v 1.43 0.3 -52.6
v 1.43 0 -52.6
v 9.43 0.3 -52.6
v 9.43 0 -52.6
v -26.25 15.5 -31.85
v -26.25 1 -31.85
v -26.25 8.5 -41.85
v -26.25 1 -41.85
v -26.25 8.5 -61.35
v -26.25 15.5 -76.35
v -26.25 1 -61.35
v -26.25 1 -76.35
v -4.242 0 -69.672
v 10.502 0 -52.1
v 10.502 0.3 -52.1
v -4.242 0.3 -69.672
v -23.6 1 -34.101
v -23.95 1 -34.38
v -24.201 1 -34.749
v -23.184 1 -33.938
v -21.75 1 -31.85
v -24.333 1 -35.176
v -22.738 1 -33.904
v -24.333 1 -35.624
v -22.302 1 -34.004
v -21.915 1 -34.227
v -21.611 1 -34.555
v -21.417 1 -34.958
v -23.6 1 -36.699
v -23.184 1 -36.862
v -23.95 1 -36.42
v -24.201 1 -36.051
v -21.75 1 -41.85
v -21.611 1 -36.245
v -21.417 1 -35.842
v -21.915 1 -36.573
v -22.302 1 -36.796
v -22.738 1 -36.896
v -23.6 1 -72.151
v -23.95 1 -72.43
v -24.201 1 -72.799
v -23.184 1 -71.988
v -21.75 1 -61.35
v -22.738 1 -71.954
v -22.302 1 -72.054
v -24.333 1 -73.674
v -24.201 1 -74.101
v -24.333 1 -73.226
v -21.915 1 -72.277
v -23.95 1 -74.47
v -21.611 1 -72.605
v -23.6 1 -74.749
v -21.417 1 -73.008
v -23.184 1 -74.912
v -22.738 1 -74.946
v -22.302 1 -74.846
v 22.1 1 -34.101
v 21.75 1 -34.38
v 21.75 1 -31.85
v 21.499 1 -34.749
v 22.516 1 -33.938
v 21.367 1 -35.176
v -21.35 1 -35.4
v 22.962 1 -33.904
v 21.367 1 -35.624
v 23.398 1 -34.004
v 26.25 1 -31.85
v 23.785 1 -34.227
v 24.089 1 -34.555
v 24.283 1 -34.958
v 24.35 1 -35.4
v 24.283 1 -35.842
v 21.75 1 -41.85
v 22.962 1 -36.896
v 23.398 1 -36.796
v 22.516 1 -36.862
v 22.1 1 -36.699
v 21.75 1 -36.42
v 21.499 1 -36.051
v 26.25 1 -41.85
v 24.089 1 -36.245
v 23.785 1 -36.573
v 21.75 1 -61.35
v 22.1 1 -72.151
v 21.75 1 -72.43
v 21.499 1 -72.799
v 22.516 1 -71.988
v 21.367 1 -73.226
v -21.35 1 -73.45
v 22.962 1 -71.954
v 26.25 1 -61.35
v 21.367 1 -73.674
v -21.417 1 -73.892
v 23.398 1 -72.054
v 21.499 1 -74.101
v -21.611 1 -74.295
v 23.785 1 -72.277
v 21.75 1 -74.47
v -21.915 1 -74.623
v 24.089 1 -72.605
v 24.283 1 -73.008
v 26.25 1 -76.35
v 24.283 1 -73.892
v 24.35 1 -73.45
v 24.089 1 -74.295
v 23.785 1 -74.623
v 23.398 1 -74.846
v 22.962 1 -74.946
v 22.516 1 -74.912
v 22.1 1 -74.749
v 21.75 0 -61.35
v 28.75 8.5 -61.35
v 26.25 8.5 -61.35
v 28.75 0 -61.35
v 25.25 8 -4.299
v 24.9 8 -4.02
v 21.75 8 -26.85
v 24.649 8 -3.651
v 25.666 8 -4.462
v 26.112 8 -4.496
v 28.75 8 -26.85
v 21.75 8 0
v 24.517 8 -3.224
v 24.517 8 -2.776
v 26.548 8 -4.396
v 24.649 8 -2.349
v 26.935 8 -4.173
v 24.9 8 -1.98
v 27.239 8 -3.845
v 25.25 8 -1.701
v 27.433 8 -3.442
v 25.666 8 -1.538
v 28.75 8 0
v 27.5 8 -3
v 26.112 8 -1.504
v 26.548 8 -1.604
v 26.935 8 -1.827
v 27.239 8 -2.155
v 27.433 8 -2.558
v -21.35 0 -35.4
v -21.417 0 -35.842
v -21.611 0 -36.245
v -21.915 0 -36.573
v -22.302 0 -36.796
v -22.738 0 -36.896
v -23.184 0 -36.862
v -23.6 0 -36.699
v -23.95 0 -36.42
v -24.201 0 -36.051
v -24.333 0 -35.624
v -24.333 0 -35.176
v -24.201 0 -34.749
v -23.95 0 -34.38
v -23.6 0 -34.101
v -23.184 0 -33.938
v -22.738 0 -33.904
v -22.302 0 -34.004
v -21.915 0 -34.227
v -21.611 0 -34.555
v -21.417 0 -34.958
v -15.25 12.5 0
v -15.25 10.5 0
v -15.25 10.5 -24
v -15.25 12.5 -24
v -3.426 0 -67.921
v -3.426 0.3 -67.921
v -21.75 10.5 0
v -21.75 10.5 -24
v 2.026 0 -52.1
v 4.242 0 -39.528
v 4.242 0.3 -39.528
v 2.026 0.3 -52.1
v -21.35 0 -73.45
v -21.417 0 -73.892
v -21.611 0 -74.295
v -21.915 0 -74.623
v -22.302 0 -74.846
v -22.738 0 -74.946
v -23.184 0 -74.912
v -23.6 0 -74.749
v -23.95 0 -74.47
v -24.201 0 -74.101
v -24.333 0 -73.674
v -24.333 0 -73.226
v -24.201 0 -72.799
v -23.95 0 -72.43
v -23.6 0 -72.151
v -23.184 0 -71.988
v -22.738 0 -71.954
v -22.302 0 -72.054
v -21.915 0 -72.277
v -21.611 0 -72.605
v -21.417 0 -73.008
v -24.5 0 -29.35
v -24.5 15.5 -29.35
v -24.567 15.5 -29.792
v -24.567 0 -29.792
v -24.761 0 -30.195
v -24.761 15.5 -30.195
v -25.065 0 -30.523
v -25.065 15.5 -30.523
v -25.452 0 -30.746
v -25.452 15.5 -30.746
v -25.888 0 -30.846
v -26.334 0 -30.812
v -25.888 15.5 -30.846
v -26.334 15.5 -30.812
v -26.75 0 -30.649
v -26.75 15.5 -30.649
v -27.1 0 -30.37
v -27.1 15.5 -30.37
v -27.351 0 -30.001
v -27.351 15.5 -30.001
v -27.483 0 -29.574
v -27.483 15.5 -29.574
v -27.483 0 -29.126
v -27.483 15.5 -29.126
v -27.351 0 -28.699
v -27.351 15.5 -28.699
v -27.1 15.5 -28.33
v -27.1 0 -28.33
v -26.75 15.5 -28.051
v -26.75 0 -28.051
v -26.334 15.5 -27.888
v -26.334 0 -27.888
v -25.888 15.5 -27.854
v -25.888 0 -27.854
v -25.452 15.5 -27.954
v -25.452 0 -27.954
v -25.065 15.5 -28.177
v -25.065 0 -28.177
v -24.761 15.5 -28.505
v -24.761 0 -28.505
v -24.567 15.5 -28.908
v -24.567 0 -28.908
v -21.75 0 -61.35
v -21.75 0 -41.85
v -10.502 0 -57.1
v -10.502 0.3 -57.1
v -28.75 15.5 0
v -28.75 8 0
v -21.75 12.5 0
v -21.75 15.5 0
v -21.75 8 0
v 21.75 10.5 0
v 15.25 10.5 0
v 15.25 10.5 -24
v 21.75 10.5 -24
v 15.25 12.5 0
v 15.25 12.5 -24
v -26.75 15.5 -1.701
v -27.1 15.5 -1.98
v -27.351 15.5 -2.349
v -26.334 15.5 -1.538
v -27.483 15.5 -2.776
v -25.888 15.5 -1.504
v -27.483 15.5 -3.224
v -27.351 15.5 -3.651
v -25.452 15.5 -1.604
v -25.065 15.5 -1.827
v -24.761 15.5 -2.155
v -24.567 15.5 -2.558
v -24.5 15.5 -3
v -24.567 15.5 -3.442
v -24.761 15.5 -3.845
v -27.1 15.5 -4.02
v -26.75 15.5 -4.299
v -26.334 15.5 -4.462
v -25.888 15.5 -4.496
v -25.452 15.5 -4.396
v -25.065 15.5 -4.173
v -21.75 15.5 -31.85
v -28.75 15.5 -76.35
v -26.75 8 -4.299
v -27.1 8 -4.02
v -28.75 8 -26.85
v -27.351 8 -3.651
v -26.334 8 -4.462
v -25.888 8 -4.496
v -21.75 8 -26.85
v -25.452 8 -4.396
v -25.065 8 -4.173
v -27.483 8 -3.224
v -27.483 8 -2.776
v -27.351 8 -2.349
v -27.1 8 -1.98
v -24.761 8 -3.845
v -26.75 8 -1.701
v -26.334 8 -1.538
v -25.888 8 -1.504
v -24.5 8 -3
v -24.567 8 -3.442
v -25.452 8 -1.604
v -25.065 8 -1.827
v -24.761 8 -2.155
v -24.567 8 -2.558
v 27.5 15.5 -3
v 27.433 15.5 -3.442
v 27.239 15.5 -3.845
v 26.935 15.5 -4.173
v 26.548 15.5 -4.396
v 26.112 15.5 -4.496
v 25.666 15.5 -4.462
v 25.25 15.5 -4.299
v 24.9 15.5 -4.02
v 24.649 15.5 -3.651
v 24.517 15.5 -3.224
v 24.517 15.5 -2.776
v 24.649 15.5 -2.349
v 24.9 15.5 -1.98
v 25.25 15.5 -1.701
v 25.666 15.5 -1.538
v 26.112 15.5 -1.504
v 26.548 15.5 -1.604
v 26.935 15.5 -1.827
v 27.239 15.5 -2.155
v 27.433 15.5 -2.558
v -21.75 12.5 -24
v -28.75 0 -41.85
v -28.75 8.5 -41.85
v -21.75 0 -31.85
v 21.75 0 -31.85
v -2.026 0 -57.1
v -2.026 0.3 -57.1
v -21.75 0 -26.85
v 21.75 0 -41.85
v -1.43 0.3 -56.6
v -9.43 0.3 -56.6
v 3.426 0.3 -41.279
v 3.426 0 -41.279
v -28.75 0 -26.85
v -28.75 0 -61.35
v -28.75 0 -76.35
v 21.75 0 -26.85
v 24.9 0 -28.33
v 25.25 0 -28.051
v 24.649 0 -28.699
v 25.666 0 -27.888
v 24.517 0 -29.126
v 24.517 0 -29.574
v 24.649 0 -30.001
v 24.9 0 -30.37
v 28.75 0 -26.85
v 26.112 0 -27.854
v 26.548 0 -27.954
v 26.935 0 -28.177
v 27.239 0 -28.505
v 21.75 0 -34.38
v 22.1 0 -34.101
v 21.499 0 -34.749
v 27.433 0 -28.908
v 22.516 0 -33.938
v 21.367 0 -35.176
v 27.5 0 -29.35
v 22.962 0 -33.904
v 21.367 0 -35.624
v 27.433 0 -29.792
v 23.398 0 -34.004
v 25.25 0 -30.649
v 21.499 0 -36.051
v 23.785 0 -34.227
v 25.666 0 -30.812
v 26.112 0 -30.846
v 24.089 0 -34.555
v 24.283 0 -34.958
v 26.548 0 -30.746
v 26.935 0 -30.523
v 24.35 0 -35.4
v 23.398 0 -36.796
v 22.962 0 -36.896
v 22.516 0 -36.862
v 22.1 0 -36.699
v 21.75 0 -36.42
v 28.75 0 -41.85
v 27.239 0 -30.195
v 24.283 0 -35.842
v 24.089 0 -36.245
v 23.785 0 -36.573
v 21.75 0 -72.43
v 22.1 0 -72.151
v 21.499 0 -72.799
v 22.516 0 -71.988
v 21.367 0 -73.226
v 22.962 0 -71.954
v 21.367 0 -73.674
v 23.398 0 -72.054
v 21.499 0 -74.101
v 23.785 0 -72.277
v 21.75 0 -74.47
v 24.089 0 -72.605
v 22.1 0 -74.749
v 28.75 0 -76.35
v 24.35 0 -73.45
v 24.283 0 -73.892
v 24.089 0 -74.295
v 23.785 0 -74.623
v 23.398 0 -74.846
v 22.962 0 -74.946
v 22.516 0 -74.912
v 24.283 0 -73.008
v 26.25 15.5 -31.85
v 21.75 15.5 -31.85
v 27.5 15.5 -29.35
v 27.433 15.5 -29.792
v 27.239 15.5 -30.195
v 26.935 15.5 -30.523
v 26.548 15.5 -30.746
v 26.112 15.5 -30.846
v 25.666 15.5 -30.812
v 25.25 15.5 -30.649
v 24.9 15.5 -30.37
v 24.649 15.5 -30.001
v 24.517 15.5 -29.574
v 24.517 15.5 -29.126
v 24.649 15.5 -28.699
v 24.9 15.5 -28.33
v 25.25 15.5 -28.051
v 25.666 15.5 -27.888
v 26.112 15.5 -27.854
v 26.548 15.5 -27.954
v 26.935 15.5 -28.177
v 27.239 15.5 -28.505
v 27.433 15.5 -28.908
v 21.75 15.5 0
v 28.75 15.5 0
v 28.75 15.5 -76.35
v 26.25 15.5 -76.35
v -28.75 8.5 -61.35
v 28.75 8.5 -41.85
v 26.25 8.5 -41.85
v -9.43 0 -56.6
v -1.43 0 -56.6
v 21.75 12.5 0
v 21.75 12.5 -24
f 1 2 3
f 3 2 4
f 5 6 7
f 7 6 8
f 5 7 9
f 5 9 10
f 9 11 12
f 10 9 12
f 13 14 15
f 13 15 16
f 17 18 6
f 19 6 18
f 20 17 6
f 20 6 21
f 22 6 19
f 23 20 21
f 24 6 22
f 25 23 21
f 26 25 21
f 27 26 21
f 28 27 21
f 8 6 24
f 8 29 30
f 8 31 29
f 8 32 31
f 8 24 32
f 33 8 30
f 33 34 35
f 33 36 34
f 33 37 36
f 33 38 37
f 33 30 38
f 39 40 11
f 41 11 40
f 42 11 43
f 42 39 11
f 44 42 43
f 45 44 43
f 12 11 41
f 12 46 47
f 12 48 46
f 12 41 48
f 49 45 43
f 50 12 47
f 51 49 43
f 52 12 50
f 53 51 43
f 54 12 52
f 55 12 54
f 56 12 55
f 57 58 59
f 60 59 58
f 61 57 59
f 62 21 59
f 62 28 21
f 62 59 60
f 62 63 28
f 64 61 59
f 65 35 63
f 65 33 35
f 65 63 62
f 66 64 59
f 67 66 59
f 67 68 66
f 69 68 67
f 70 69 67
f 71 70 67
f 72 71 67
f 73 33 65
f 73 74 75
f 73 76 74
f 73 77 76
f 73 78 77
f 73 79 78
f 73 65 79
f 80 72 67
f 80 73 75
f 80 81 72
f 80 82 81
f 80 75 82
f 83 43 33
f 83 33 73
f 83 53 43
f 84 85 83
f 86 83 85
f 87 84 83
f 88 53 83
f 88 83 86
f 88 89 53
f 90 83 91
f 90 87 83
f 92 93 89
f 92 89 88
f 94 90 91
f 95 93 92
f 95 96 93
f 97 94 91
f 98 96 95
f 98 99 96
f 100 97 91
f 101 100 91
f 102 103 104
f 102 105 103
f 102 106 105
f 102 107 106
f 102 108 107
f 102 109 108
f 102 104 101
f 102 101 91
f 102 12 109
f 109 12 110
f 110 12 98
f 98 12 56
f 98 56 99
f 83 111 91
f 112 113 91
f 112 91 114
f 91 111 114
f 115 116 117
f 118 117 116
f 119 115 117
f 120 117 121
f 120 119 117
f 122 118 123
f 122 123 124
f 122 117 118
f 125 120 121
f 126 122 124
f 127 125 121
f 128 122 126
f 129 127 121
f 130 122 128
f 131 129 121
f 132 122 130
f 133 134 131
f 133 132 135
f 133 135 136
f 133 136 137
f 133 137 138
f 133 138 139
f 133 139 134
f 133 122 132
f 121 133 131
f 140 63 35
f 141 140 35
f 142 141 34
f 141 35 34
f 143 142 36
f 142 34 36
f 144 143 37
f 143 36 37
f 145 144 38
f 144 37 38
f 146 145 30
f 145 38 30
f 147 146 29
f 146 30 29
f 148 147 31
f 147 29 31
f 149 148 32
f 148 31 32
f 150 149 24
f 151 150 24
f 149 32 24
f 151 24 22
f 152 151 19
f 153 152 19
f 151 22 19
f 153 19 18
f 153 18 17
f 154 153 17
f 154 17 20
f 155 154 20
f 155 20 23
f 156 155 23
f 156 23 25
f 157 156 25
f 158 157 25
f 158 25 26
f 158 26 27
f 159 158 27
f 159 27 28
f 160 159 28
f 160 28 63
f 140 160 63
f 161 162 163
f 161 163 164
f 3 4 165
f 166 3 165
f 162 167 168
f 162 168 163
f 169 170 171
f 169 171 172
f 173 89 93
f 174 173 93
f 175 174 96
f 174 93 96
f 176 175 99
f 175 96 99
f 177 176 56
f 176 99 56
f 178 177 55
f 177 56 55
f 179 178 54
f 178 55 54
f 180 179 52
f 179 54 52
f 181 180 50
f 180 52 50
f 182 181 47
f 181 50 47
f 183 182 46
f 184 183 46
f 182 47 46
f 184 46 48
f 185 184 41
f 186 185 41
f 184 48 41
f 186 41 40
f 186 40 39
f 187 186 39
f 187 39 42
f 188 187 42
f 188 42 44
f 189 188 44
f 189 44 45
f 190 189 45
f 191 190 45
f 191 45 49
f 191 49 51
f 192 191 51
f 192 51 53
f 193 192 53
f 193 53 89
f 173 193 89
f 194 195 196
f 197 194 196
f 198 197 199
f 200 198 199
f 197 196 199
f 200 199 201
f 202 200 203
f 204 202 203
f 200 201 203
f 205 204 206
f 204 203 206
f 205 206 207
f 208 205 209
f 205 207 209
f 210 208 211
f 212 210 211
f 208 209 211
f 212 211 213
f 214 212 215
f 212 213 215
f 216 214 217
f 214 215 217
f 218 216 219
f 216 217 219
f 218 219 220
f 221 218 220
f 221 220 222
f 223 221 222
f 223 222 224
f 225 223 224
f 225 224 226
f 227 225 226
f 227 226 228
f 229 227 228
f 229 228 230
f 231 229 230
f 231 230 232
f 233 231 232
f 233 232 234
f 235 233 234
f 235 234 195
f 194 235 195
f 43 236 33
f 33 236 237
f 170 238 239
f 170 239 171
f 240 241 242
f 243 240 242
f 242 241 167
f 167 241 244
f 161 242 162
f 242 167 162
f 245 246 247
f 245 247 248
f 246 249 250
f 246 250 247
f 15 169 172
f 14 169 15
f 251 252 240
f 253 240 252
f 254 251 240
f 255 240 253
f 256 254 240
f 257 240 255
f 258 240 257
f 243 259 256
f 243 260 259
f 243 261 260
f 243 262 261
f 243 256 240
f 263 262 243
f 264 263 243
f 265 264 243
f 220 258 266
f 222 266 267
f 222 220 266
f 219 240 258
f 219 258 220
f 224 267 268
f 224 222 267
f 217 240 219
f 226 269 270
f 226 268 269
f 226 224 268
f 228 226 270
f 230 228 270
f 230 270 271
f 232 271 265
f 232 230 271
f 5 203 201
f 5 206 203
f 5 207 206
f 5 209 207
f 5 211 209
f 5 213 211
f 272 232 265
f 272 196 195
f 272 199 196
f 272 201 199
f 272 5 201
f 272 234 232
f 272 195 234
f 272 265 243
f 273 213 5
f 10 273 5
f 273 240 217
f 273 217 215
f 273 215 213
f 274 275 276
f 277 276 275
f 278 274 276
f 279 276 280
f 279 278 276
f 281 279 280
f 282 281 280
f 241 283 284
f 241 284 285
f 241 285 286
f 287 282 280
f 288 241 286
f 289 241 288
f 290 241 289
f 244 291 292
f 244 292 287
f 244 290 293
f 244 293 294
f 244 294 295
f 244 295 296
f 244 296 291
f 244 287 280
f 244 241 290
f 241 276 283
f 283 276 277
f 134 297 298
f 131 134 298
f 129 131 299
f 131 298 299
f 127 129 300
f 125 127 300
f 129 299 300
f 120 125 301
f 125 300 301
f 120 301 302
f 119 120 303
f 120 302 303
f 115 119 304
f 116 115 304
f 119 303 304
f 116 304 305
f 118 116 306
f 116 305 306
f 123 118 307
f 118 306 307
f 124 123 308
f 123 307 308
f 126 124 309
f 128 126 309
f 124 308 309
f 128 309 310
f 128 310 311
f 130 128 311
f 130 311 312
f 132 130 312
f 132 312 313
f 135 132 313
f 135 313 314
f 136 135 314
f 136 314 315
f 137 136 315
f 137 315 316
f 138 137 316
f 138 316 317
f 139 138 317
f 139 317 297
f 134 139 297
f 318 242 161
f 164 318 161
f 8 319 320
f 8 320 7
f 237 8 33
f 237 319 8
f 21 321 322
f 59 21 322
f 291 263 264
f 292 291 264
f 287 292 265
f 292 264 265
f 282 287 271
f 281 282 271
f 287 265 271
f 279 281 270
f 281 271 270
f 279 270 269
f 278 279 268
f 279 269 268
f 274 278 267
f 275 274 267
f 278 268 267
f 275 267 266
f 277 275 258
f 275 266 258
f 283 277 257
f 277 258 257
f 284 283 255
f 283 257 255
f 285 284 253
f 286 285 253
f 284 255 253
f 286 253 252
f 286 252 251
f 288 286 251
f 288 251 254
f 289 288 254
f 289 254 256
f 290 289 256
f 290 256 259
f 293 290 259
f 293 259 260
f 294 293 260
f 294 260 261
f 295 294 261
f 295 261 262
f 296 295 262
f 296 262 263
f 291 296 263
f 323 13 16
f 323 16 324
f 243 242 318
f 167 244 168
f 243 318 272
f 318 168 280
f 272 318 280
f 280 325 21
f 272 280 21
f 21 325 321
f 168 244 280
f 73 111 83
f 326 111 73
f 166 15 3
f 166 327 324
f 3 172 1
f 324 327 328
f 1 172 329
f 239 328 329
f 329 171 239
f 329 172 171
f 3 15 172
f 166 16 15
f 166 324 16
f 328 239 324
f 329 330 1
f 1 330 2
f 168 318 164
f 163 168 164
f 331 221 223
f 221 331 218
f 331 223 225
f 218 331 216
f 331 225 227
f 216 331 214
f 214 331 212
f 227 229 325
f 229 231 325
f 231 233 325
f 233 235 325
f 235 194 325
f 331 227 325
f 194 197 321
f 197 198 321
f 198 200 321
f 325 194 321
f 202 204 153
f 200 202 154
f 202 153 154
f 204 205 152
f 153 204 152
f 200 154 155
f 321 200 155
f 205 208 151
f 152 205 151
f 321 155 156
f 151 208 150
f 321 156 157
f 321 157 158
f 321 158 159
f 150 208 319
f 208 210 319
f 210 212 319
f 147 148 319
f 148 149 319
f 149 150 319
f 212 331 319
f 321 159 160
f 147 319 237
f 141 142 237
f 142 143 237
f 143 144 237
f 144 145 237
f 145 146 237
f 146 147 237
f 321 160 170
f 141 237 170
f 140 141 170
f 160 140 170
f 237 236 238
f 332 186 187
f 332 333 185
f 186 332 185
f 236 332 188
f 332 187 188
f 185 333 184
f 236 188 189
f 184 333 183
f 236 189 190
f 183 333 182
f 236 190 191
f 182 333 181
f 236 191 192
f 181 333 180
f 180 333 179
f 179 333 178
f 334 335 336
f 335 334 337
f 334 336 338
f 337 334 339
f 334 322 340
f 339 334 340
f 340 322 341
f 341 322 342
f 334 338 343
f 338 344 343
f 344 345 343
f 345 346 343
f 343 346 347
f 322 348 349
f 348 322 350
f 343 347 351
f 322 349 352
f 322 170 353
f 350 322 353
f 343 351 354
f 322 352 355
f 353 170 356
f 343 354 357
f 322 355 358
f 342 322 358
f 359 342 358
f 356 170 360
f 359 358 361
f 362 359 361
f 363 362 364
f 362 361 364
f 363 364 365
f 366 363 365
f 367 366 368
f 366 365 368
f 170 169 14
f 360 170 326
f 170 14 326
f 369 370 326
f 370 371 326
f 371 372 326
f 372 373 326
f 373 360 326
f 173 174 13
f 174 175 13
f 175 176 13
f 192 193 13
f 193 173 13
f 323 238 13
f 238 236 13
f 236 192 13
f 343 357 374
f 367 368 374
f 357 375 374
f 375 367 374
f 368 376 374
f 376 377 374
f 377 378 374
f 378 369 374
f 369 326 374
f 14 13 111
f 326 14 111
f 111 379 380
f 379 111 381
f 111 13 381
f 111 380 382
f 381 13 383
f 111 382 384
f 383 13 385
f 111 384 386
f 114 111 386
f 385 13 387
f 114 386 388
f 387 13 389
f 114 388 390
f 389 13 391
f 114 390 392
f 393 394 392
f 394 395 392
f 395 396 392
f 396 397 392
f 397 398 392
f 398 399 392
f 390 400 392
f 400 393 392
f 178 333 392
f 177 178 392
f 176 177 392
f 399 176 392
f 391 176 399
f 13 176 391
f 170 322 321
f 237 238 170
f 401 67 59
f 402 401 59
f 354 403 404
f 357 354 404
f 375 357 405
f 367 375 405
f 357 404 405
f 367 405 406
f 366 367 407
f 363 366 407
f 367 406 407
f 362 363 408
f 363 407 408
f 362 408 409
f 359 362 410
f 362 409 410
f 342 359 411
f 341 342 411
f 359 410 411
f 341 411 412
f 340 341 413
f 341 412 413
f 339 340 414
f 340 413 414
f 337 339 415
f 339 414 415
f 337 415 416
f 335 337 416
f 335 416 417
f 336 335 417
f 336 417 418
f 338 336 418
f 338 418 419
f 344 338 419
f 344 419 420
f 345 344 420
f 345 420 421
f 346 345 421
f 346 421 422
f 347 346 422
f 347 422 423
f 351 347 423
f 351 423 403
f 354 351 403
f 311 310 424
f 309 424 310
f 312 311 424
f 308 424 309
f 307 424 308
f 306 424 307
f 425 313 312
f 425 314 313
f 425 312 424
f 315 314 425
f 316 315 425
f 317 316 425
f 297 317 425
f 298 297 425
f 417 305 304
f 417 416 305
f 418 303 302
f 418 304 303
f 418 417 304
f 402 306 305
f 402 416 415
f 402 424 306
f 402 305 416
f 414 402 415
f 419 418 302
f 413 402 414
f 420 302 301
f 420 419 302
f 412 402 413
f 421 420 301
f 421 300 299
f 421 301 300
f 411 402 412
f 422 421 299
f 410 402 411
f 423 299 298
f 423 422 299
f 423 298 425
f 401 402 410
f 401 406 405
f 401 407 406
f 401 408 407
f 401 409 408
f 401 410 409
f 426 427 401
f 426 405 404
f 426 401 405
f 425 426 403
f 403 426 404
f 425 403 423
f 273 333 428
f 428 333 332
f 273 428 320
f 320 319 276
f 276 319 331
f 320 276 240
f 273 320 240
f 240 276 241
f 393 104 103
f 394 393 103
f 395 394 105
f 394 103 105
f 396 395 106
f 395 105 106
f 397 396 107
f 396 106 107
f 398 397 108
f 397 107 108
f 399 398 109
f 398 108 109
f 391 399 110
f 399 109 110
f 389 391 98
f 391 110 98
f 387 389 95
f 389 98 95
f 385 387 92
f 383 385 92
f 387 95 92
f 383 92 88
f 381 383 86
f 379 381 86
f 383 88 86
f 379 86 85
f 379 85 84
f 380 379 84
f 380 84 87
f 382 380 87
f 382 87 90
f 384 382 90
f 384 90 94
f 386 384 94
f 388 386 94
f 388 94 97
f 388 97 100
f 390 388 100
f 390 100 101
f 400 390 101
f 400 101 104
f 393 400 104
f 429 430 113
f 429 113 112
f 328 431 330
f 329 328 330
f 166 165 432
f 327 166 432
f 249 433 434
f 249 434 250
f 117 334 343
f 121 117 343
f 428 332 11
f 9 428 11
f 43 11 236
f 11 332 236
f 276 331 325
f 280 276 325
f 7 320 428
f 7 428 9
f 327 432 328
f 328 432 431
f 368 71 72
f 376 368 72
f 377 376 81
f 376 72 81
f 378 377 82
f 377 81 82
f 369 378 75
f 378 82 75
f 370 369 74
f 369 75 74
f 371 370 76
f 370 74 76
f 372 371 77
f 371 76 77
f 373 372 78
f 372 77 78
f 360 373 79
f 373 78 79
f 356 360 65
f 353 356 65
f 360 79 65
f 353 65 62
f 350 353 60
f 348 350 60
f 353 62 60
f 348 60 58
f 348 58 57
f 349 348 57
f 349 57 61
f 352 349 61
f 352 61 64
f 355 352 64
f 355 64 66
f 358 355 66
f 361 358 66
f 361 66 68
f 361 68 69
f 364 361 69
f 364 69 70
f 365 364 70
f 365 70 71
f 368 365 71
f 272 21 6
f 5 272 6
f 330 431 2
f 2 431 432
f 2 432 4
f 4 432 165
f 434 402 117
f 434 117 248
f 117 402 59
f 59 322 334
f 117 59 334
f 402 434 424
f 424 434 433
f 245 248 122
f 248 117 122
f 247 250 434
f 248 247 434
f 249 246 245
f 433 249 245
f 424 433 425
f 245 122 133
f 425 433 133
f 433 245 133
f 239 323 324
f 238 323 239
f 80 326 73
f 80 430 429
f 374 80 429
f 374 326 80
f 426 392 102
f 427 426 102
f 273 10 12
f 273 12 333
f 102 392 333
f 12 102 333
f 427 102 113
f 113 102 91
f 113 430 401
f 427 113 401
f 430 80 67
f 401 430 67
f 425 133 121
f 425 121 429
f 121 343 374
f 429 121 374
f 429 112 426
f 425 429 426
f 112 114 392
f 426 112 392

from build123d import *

# Parameters (mm, degrees)
SKETCH1_W                = 52.5
SKETCH1_H                = 44.5
BOSS_EXTRUDE1_DEPTH      = 1
BOSS_EXTRUDE2_DEPTH      = 15.5
F_3_0_3_DIAMETER_HOLE1_D = 3
SKETCH6_W                = 6.5
SKETCH6_H                = 2
BOSS_EXTRUDE3_DEPTH      = 24
SKETCH6_4_W              = 7
SKETCH6_4_H              = 8
CUT_EXTRUDE1_DEPTH       = 26.85
SKETCH8_W                = 7
SKETCH8_H                = 19.5
CUT_EXTRUDE2_DEPTH       = 8.5
CUT_EXTRUDE3_DEPTH       = 0.3


with BuildPart() as part:
    # Sketch1 → Boss-Extrude1 (new body)
    with BuildSketch(Plane(origin=(0, 0, 0), x_dir=(1, 0, 0), z_dir=(0, 1, 0))):
        with Locations((0, 54.1)):
            Rectangle(SKETCH1_W, SKETCH1_H)
    extrude(amount=BOSS_EXTRUDE1_DEPTH)

    # Sketch1<3> → Boss-Extrude2 (add)
    with BuildSketch(Plane(origin=(0, 0, 0), x_dir=(1, 0, 0), z_dir=(0, 1, 0))):
        Polygon((-26.25, 76.35), (-28.75, 76.35), (-28.75, 0), (-21.75, 0), (-21.75, 31.85), (-26.25, 31.85), align=None)
        Polygon((28.75, 76.35), (26.25, 76.35), (26.25, 31.85), (21.75, 31.85), (21.75, 0), (28.75, 0), align=None)
    extrude(amount=BOSS_EXTRUDE2_DEPTH)

    # Ø3.0 (3) Diameter Hole1 (through all)
    with Locations(Plane(origin=(0, 0, 0), x_dir=(-1, 0, 0), z_dir=(0, -1, 0))):
        with Locations((-22.85, 73.45), (22.85, 73.45), (26, 29.35), (22.85, 35.4), (-22.85, 35.4), (-26, 29.35), (-26, 3), (26, 3), (-30.25, 71.35), (30.25, 71.35)):
            Hole(F_3_0_3_DIAMETER_HOLE1_D / 2)

    # Sketch6 → Boss-Extrude3 (add)
    with BuildSketch(Plane.XY):
        with Locations((-18.5, 11.5)):
            Rectangle(SKETCH6_W, SKETCH6_H)
        with Locations((18.5, 11.5)):
            Rectangle(SKETCH6_W, SKETCH6_H)
    extrude(amount=-BOSS_EXTRUDE3_DEPTH)

    # Sketch6<4> → Cut-Extrude1 (cut)
    with BuildSketch(Plane.XY):
        with Locations((-25.25, 4)):
            Rectangle(SKETCH6_4_W, SKETCH6_4_H)
        with Locations((25.25, 4)):
            Rectangle(SKETCH6_4_W, SKETCH6_4_H)
    extrude(amount=-CUT_EXTRUDE1_DEPTH, mode=Mode.SUBTRACT)

    # Sketch8 → Cut-Extrude2 (cut)
    with BuildSketch(Plane.XZ):
        with Locations((-25.25, -51.6)):
            Rectangle(SKETCH8_W, SKETCH8_H)
        with Locations((25.25, -51.6)):
            Rectangle(SKETCH8_W, SKETCH8_H)
    extrude(amount=-CUT_EXTRUDE2_DEPTH, mode=Mode.SUBTRACT)

    # Sketch9 → Cut-Extrude3 (cut)
    with BuildSketch(Plane.XZ):
        Polygon((-10.502040481, -57.1), (4.24240096, -39.528258941), (2.025663817, -52.1), (10.502040481, -52.1), (-4.24240096, -69.671741059), (-2.025663817, -57.1), align=None)
        Polygon((-3.425965173, -67.920888862), (-1.429787021, -56.6), (-9.429787021, -56.6), (3.425965173, -41.279111138), (1.429787021, -52.6), (9.429787021, -52.6), align=None, mode=Mode.SUBTRACT)
    extrude(amount=-CUT_EXTRUDE3_DEPTH, mode=Mode.SUBTRACT)


solid = part.part
